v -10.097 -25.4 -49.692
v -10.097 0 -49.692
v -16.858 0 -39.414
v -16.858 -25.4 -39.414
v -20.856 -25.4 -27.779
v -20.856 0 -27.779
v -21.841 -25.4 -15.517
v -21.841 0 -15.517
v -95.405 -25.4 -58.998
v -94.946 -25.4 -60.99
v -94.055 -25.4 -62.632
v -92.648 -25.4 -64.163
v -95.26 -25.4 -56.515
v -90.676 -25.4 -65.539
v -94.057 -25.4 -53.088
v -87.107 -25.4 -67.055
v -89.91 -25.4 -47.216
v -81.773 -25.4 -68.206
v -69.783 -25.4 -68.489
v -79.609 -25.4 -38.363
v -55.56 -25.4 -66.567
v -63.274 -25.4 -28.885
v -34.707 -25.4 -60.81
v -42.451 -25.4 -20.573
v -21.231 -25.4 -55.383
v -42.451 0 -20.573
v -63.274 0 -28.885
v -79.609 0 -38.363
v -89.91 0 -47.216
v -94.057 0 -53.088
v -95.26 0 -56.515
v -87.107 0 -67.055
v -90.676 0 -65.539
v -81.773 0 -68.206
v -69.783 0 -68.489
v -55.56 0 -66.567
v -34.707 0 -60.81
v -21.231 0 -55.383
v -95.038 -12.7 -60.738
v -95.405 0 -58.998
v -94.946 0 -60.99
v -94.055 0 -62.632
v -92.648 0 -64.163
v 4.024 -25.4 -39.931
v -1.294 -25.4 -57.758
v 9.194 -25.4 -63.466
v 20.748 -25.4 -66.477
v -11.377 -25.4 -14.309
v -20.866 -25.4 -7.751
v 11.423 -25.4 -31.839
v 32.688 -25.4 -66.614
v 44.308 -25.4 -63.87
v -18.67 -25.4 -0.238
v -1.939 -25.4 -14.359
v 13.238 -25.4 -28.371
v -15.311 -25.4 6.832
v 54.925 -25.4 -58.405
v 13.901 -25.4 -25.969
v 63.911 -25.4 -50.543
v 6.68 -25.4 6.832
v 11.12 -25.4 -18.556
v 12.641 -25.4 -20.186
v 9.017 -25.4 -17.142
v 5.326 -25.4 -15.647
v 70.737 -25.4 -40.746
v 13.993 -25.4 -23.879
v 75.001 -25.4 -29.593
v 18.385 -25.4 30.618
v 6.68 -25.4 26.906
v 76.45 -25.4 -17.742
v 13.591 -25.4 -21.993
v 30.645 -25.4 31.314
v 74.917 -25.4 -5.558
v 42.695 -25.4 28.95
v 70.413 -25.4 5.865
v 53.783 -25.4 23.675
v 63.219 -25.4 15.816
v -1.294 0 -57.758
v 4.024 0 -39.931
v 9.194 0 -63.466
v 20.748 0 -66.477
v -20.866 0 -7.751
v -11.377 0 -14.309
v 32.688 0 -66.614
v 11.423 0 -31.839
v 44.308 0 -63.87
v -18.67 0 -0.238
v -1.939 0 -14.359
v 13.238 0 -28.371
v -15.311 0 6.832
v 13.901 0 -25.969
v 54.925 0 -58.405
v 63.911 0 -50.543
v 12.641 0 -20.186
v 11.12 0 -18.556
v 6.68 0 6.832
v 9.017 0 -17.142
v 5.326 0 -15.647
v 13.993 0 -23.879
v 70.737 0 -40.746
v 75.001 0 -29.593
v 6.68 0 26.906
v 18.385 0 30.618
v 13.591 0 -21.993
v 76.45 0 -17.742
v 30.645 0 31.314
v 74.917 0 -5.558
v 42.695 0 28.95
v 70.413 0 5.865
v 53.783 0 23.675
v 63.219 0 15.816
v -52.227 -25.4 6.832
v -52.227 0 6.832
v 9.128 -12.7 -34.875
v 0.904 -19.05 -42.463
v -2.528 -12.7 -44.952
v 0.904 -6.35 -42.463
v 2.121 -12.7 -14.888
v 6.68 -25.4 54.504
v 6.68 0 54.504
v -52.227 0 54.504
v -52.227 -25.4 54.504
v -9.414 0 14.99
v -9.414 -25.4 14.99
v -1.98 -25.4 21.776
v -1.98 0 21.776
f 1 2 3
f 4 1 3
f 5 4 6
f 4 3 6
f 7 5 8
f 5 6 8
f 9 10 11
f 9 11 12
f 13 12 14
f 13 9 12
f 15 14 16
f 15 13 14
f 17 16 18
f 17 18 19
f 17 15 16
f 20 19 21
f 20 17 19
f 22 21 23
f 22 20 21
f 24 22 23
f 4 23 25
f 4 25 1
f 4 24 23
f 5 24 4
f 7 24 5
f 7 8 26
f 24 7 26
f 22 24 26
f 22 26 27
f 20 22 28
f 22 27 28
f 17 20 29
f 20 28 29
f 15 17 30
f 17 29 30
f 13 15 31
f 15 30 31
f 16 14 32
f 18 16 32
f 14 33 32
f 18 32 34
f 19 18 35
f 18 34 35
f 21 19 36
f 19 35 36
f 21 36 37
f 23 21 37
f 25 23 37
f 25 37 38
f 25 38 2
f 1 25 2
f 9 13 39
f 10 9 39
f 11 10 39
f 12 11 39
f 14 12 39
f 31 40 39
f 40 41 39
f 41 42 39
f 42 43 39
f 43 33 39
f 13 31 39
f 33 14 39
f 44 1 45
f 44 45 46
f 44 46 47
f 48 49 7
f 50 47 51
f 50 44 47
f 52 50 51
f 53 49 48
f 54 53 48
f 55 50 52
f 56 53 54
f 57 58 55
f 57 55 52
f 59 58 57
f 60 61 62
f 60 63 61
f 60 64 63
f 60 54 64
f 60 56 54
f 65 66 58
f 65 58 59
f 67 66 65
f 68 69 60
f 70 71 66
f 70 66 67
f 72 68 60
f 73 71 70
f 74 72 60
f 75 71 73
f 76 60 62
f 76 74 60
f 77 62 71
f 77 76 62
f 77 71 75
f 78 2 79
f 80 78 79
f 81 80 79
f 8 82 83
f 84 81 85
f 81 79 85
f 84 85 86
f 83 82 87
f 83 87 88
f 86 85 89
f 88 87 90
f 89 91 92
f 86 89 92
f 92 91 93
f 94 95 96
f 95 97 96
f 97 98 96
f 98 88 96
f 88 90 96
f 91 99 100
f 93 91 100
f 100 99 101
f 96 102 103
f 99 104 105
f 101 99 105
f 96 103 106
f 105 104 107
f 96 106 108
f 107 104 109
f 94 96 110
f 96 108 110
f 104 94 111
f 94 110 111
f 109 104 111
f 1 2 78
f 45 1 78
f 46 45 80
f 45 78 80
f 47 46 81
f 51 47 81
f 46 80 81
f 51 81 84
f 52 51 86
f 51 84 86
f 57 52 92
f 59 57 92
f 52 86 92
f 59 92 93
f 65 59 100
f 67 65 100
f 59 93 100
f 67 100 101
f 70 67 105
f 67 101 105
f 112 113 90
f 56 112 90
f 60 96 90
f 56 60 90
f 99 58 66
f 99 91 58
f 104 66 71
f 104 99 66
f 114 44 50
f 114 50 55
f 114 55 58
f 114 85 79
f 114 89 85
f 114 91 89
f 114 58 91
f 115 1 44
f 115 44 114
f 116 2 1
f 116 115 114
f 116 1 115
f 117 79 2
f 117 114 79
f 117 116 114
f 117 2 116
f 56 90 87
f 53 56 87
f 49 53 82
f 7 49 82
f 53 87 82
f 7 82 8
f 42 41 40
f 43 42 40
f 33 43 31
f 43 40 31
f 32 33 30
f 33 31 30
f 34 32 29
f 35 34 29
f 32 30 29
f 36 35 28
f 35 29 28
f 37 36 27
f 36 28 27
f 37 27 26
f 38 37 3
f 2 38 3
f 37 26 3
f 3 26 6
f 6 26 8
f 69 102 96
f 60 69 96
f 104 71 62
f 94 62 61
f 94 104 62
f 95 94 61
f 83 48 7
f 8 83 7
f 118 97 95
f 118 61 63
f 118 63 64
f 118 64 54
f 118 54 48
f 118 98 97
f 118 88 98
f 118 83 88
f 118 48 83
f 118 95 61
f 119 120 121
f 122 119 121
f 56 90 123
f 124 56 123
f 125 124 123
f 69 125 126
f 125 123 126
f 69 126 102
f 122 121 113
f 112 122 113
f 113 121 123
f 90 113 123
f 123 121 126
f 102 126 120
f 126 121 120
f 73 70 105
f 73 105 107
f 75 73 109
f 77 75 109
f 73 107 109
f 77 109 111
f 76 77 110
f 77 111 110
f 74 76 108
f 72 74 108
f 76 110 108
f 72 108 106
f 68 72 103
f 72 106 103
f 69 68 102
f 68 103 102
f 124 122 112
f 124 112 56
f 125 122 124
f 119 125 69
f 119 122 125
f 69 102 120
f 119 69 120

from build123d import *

# Parameters (mm, degrees)
F1_DEPTH = 25.4


with BuildPart() as f1:
    # F0 (on Front) → F1 (new body)
    with BuildSketch(Plane.XZ):
        with BuildLine():
            ThreePointArc((-10.0966715076, -49.6915544474), (-19.2221133603, -33.7221838937), (-21.8410624019, -15.5168113129))
            add(Edge.make_bspline(
                [(-21.8410624019, -15.5168113129), (-105.8196860966, -29.3638972747), (-95.0377107933, -60.7381285816), (-84.25573549, -92.1123598885), (-10.0966715076, -49.6915544474)],
                knots=[1.0936579361, 1.0936579361, 1.0936579361, 3.1372411639, 3.1372411639, 5.1808243917, 5.1808243917, 5.1808243917], degree=2, weights=[1, 0.5218384635, 1, 0.5218384635, 1]))
        make_face()
    extrude(amount=F1_DEPTH)


with BuildPart() as f1b:
    # F0 (on Front) → F1, piece 2 (new body)
    with BuildSketch(Plane.XZ):
        with BuildLine():
            Line((6.6801547073, 6.8319737911), (-15.3106102166, 6.8319737911))
            ThreePointArc((-15.3106102166, 6.8319737911), (-19.9177365411, -3.9503072765), (-21.8410624019, -15.5168113129))
            add(Edge.make_bspline(
                [(13.5911954567, -21.9925157726), (9.4321632775, -10.3602247289), (-21.8410624019, -15.5168113129)],
                knots=[0, 0, 0, 1.0936579361, 1.0936579361, 1.0936579361], degree=2, weights=[1, 0.8541776909, 1]))
            add(Edge.make_bspline(
                [(-10.0966715076, -49.6915544474), (17.7910829978, -33.7390741364), (13.5911954567, -21.9925157726)],
                knots=[5.1808243917, 5.1808243917, 5.1808243917, 6.2831853072, 6.2831853072, 6.2831853072], degree=2, weights=[1, 0.851906918, 1]))
            ThreePointArc((-10.0966715076, -49.6915544474), (44.3081827968, -63.8696064391), (76.4502558698, -17.7416055208))
            ThreePointArc((76.4502558698, -17.7416055208), (53.783080596, 23.6749028729), (6.6801547073, 26.9063692804))
            Line((6.6801547073, 26.9063692804), (6.6801547073, 6.8319737911))
        make_face()
    extrude(amount=F1_DEPTH)


with BuildPart() as f1c:
    # F0 (on Front) → F1, piece 3 (new body)
    with BuildSketch(Plane.XZ):
        with BuildLine():
            Line((-52.2266402841, 54.5039623976), (-52.2266402841, 6.8319737911))
            Line((-52.2266402841, 6.8319737911), (-15.3106102166, 6.8319737911))
            ThreePointArc((-15.3106102166, 6.8319737911), (-5.8712528687, 18.5737400502), (6.6801547073, 26.9063692804))
            Line((6.6801547073, 26.9063692804), (6.6801547073, 54.5039623976))
            Line((6.6801547073, 54.5039623976), (-52.2266402841, 54.5039623976))
        make_face()
    extrude(amount=F1_DEPTH)


solid = Compound([f1.part, f1b.part, f1c.part])
